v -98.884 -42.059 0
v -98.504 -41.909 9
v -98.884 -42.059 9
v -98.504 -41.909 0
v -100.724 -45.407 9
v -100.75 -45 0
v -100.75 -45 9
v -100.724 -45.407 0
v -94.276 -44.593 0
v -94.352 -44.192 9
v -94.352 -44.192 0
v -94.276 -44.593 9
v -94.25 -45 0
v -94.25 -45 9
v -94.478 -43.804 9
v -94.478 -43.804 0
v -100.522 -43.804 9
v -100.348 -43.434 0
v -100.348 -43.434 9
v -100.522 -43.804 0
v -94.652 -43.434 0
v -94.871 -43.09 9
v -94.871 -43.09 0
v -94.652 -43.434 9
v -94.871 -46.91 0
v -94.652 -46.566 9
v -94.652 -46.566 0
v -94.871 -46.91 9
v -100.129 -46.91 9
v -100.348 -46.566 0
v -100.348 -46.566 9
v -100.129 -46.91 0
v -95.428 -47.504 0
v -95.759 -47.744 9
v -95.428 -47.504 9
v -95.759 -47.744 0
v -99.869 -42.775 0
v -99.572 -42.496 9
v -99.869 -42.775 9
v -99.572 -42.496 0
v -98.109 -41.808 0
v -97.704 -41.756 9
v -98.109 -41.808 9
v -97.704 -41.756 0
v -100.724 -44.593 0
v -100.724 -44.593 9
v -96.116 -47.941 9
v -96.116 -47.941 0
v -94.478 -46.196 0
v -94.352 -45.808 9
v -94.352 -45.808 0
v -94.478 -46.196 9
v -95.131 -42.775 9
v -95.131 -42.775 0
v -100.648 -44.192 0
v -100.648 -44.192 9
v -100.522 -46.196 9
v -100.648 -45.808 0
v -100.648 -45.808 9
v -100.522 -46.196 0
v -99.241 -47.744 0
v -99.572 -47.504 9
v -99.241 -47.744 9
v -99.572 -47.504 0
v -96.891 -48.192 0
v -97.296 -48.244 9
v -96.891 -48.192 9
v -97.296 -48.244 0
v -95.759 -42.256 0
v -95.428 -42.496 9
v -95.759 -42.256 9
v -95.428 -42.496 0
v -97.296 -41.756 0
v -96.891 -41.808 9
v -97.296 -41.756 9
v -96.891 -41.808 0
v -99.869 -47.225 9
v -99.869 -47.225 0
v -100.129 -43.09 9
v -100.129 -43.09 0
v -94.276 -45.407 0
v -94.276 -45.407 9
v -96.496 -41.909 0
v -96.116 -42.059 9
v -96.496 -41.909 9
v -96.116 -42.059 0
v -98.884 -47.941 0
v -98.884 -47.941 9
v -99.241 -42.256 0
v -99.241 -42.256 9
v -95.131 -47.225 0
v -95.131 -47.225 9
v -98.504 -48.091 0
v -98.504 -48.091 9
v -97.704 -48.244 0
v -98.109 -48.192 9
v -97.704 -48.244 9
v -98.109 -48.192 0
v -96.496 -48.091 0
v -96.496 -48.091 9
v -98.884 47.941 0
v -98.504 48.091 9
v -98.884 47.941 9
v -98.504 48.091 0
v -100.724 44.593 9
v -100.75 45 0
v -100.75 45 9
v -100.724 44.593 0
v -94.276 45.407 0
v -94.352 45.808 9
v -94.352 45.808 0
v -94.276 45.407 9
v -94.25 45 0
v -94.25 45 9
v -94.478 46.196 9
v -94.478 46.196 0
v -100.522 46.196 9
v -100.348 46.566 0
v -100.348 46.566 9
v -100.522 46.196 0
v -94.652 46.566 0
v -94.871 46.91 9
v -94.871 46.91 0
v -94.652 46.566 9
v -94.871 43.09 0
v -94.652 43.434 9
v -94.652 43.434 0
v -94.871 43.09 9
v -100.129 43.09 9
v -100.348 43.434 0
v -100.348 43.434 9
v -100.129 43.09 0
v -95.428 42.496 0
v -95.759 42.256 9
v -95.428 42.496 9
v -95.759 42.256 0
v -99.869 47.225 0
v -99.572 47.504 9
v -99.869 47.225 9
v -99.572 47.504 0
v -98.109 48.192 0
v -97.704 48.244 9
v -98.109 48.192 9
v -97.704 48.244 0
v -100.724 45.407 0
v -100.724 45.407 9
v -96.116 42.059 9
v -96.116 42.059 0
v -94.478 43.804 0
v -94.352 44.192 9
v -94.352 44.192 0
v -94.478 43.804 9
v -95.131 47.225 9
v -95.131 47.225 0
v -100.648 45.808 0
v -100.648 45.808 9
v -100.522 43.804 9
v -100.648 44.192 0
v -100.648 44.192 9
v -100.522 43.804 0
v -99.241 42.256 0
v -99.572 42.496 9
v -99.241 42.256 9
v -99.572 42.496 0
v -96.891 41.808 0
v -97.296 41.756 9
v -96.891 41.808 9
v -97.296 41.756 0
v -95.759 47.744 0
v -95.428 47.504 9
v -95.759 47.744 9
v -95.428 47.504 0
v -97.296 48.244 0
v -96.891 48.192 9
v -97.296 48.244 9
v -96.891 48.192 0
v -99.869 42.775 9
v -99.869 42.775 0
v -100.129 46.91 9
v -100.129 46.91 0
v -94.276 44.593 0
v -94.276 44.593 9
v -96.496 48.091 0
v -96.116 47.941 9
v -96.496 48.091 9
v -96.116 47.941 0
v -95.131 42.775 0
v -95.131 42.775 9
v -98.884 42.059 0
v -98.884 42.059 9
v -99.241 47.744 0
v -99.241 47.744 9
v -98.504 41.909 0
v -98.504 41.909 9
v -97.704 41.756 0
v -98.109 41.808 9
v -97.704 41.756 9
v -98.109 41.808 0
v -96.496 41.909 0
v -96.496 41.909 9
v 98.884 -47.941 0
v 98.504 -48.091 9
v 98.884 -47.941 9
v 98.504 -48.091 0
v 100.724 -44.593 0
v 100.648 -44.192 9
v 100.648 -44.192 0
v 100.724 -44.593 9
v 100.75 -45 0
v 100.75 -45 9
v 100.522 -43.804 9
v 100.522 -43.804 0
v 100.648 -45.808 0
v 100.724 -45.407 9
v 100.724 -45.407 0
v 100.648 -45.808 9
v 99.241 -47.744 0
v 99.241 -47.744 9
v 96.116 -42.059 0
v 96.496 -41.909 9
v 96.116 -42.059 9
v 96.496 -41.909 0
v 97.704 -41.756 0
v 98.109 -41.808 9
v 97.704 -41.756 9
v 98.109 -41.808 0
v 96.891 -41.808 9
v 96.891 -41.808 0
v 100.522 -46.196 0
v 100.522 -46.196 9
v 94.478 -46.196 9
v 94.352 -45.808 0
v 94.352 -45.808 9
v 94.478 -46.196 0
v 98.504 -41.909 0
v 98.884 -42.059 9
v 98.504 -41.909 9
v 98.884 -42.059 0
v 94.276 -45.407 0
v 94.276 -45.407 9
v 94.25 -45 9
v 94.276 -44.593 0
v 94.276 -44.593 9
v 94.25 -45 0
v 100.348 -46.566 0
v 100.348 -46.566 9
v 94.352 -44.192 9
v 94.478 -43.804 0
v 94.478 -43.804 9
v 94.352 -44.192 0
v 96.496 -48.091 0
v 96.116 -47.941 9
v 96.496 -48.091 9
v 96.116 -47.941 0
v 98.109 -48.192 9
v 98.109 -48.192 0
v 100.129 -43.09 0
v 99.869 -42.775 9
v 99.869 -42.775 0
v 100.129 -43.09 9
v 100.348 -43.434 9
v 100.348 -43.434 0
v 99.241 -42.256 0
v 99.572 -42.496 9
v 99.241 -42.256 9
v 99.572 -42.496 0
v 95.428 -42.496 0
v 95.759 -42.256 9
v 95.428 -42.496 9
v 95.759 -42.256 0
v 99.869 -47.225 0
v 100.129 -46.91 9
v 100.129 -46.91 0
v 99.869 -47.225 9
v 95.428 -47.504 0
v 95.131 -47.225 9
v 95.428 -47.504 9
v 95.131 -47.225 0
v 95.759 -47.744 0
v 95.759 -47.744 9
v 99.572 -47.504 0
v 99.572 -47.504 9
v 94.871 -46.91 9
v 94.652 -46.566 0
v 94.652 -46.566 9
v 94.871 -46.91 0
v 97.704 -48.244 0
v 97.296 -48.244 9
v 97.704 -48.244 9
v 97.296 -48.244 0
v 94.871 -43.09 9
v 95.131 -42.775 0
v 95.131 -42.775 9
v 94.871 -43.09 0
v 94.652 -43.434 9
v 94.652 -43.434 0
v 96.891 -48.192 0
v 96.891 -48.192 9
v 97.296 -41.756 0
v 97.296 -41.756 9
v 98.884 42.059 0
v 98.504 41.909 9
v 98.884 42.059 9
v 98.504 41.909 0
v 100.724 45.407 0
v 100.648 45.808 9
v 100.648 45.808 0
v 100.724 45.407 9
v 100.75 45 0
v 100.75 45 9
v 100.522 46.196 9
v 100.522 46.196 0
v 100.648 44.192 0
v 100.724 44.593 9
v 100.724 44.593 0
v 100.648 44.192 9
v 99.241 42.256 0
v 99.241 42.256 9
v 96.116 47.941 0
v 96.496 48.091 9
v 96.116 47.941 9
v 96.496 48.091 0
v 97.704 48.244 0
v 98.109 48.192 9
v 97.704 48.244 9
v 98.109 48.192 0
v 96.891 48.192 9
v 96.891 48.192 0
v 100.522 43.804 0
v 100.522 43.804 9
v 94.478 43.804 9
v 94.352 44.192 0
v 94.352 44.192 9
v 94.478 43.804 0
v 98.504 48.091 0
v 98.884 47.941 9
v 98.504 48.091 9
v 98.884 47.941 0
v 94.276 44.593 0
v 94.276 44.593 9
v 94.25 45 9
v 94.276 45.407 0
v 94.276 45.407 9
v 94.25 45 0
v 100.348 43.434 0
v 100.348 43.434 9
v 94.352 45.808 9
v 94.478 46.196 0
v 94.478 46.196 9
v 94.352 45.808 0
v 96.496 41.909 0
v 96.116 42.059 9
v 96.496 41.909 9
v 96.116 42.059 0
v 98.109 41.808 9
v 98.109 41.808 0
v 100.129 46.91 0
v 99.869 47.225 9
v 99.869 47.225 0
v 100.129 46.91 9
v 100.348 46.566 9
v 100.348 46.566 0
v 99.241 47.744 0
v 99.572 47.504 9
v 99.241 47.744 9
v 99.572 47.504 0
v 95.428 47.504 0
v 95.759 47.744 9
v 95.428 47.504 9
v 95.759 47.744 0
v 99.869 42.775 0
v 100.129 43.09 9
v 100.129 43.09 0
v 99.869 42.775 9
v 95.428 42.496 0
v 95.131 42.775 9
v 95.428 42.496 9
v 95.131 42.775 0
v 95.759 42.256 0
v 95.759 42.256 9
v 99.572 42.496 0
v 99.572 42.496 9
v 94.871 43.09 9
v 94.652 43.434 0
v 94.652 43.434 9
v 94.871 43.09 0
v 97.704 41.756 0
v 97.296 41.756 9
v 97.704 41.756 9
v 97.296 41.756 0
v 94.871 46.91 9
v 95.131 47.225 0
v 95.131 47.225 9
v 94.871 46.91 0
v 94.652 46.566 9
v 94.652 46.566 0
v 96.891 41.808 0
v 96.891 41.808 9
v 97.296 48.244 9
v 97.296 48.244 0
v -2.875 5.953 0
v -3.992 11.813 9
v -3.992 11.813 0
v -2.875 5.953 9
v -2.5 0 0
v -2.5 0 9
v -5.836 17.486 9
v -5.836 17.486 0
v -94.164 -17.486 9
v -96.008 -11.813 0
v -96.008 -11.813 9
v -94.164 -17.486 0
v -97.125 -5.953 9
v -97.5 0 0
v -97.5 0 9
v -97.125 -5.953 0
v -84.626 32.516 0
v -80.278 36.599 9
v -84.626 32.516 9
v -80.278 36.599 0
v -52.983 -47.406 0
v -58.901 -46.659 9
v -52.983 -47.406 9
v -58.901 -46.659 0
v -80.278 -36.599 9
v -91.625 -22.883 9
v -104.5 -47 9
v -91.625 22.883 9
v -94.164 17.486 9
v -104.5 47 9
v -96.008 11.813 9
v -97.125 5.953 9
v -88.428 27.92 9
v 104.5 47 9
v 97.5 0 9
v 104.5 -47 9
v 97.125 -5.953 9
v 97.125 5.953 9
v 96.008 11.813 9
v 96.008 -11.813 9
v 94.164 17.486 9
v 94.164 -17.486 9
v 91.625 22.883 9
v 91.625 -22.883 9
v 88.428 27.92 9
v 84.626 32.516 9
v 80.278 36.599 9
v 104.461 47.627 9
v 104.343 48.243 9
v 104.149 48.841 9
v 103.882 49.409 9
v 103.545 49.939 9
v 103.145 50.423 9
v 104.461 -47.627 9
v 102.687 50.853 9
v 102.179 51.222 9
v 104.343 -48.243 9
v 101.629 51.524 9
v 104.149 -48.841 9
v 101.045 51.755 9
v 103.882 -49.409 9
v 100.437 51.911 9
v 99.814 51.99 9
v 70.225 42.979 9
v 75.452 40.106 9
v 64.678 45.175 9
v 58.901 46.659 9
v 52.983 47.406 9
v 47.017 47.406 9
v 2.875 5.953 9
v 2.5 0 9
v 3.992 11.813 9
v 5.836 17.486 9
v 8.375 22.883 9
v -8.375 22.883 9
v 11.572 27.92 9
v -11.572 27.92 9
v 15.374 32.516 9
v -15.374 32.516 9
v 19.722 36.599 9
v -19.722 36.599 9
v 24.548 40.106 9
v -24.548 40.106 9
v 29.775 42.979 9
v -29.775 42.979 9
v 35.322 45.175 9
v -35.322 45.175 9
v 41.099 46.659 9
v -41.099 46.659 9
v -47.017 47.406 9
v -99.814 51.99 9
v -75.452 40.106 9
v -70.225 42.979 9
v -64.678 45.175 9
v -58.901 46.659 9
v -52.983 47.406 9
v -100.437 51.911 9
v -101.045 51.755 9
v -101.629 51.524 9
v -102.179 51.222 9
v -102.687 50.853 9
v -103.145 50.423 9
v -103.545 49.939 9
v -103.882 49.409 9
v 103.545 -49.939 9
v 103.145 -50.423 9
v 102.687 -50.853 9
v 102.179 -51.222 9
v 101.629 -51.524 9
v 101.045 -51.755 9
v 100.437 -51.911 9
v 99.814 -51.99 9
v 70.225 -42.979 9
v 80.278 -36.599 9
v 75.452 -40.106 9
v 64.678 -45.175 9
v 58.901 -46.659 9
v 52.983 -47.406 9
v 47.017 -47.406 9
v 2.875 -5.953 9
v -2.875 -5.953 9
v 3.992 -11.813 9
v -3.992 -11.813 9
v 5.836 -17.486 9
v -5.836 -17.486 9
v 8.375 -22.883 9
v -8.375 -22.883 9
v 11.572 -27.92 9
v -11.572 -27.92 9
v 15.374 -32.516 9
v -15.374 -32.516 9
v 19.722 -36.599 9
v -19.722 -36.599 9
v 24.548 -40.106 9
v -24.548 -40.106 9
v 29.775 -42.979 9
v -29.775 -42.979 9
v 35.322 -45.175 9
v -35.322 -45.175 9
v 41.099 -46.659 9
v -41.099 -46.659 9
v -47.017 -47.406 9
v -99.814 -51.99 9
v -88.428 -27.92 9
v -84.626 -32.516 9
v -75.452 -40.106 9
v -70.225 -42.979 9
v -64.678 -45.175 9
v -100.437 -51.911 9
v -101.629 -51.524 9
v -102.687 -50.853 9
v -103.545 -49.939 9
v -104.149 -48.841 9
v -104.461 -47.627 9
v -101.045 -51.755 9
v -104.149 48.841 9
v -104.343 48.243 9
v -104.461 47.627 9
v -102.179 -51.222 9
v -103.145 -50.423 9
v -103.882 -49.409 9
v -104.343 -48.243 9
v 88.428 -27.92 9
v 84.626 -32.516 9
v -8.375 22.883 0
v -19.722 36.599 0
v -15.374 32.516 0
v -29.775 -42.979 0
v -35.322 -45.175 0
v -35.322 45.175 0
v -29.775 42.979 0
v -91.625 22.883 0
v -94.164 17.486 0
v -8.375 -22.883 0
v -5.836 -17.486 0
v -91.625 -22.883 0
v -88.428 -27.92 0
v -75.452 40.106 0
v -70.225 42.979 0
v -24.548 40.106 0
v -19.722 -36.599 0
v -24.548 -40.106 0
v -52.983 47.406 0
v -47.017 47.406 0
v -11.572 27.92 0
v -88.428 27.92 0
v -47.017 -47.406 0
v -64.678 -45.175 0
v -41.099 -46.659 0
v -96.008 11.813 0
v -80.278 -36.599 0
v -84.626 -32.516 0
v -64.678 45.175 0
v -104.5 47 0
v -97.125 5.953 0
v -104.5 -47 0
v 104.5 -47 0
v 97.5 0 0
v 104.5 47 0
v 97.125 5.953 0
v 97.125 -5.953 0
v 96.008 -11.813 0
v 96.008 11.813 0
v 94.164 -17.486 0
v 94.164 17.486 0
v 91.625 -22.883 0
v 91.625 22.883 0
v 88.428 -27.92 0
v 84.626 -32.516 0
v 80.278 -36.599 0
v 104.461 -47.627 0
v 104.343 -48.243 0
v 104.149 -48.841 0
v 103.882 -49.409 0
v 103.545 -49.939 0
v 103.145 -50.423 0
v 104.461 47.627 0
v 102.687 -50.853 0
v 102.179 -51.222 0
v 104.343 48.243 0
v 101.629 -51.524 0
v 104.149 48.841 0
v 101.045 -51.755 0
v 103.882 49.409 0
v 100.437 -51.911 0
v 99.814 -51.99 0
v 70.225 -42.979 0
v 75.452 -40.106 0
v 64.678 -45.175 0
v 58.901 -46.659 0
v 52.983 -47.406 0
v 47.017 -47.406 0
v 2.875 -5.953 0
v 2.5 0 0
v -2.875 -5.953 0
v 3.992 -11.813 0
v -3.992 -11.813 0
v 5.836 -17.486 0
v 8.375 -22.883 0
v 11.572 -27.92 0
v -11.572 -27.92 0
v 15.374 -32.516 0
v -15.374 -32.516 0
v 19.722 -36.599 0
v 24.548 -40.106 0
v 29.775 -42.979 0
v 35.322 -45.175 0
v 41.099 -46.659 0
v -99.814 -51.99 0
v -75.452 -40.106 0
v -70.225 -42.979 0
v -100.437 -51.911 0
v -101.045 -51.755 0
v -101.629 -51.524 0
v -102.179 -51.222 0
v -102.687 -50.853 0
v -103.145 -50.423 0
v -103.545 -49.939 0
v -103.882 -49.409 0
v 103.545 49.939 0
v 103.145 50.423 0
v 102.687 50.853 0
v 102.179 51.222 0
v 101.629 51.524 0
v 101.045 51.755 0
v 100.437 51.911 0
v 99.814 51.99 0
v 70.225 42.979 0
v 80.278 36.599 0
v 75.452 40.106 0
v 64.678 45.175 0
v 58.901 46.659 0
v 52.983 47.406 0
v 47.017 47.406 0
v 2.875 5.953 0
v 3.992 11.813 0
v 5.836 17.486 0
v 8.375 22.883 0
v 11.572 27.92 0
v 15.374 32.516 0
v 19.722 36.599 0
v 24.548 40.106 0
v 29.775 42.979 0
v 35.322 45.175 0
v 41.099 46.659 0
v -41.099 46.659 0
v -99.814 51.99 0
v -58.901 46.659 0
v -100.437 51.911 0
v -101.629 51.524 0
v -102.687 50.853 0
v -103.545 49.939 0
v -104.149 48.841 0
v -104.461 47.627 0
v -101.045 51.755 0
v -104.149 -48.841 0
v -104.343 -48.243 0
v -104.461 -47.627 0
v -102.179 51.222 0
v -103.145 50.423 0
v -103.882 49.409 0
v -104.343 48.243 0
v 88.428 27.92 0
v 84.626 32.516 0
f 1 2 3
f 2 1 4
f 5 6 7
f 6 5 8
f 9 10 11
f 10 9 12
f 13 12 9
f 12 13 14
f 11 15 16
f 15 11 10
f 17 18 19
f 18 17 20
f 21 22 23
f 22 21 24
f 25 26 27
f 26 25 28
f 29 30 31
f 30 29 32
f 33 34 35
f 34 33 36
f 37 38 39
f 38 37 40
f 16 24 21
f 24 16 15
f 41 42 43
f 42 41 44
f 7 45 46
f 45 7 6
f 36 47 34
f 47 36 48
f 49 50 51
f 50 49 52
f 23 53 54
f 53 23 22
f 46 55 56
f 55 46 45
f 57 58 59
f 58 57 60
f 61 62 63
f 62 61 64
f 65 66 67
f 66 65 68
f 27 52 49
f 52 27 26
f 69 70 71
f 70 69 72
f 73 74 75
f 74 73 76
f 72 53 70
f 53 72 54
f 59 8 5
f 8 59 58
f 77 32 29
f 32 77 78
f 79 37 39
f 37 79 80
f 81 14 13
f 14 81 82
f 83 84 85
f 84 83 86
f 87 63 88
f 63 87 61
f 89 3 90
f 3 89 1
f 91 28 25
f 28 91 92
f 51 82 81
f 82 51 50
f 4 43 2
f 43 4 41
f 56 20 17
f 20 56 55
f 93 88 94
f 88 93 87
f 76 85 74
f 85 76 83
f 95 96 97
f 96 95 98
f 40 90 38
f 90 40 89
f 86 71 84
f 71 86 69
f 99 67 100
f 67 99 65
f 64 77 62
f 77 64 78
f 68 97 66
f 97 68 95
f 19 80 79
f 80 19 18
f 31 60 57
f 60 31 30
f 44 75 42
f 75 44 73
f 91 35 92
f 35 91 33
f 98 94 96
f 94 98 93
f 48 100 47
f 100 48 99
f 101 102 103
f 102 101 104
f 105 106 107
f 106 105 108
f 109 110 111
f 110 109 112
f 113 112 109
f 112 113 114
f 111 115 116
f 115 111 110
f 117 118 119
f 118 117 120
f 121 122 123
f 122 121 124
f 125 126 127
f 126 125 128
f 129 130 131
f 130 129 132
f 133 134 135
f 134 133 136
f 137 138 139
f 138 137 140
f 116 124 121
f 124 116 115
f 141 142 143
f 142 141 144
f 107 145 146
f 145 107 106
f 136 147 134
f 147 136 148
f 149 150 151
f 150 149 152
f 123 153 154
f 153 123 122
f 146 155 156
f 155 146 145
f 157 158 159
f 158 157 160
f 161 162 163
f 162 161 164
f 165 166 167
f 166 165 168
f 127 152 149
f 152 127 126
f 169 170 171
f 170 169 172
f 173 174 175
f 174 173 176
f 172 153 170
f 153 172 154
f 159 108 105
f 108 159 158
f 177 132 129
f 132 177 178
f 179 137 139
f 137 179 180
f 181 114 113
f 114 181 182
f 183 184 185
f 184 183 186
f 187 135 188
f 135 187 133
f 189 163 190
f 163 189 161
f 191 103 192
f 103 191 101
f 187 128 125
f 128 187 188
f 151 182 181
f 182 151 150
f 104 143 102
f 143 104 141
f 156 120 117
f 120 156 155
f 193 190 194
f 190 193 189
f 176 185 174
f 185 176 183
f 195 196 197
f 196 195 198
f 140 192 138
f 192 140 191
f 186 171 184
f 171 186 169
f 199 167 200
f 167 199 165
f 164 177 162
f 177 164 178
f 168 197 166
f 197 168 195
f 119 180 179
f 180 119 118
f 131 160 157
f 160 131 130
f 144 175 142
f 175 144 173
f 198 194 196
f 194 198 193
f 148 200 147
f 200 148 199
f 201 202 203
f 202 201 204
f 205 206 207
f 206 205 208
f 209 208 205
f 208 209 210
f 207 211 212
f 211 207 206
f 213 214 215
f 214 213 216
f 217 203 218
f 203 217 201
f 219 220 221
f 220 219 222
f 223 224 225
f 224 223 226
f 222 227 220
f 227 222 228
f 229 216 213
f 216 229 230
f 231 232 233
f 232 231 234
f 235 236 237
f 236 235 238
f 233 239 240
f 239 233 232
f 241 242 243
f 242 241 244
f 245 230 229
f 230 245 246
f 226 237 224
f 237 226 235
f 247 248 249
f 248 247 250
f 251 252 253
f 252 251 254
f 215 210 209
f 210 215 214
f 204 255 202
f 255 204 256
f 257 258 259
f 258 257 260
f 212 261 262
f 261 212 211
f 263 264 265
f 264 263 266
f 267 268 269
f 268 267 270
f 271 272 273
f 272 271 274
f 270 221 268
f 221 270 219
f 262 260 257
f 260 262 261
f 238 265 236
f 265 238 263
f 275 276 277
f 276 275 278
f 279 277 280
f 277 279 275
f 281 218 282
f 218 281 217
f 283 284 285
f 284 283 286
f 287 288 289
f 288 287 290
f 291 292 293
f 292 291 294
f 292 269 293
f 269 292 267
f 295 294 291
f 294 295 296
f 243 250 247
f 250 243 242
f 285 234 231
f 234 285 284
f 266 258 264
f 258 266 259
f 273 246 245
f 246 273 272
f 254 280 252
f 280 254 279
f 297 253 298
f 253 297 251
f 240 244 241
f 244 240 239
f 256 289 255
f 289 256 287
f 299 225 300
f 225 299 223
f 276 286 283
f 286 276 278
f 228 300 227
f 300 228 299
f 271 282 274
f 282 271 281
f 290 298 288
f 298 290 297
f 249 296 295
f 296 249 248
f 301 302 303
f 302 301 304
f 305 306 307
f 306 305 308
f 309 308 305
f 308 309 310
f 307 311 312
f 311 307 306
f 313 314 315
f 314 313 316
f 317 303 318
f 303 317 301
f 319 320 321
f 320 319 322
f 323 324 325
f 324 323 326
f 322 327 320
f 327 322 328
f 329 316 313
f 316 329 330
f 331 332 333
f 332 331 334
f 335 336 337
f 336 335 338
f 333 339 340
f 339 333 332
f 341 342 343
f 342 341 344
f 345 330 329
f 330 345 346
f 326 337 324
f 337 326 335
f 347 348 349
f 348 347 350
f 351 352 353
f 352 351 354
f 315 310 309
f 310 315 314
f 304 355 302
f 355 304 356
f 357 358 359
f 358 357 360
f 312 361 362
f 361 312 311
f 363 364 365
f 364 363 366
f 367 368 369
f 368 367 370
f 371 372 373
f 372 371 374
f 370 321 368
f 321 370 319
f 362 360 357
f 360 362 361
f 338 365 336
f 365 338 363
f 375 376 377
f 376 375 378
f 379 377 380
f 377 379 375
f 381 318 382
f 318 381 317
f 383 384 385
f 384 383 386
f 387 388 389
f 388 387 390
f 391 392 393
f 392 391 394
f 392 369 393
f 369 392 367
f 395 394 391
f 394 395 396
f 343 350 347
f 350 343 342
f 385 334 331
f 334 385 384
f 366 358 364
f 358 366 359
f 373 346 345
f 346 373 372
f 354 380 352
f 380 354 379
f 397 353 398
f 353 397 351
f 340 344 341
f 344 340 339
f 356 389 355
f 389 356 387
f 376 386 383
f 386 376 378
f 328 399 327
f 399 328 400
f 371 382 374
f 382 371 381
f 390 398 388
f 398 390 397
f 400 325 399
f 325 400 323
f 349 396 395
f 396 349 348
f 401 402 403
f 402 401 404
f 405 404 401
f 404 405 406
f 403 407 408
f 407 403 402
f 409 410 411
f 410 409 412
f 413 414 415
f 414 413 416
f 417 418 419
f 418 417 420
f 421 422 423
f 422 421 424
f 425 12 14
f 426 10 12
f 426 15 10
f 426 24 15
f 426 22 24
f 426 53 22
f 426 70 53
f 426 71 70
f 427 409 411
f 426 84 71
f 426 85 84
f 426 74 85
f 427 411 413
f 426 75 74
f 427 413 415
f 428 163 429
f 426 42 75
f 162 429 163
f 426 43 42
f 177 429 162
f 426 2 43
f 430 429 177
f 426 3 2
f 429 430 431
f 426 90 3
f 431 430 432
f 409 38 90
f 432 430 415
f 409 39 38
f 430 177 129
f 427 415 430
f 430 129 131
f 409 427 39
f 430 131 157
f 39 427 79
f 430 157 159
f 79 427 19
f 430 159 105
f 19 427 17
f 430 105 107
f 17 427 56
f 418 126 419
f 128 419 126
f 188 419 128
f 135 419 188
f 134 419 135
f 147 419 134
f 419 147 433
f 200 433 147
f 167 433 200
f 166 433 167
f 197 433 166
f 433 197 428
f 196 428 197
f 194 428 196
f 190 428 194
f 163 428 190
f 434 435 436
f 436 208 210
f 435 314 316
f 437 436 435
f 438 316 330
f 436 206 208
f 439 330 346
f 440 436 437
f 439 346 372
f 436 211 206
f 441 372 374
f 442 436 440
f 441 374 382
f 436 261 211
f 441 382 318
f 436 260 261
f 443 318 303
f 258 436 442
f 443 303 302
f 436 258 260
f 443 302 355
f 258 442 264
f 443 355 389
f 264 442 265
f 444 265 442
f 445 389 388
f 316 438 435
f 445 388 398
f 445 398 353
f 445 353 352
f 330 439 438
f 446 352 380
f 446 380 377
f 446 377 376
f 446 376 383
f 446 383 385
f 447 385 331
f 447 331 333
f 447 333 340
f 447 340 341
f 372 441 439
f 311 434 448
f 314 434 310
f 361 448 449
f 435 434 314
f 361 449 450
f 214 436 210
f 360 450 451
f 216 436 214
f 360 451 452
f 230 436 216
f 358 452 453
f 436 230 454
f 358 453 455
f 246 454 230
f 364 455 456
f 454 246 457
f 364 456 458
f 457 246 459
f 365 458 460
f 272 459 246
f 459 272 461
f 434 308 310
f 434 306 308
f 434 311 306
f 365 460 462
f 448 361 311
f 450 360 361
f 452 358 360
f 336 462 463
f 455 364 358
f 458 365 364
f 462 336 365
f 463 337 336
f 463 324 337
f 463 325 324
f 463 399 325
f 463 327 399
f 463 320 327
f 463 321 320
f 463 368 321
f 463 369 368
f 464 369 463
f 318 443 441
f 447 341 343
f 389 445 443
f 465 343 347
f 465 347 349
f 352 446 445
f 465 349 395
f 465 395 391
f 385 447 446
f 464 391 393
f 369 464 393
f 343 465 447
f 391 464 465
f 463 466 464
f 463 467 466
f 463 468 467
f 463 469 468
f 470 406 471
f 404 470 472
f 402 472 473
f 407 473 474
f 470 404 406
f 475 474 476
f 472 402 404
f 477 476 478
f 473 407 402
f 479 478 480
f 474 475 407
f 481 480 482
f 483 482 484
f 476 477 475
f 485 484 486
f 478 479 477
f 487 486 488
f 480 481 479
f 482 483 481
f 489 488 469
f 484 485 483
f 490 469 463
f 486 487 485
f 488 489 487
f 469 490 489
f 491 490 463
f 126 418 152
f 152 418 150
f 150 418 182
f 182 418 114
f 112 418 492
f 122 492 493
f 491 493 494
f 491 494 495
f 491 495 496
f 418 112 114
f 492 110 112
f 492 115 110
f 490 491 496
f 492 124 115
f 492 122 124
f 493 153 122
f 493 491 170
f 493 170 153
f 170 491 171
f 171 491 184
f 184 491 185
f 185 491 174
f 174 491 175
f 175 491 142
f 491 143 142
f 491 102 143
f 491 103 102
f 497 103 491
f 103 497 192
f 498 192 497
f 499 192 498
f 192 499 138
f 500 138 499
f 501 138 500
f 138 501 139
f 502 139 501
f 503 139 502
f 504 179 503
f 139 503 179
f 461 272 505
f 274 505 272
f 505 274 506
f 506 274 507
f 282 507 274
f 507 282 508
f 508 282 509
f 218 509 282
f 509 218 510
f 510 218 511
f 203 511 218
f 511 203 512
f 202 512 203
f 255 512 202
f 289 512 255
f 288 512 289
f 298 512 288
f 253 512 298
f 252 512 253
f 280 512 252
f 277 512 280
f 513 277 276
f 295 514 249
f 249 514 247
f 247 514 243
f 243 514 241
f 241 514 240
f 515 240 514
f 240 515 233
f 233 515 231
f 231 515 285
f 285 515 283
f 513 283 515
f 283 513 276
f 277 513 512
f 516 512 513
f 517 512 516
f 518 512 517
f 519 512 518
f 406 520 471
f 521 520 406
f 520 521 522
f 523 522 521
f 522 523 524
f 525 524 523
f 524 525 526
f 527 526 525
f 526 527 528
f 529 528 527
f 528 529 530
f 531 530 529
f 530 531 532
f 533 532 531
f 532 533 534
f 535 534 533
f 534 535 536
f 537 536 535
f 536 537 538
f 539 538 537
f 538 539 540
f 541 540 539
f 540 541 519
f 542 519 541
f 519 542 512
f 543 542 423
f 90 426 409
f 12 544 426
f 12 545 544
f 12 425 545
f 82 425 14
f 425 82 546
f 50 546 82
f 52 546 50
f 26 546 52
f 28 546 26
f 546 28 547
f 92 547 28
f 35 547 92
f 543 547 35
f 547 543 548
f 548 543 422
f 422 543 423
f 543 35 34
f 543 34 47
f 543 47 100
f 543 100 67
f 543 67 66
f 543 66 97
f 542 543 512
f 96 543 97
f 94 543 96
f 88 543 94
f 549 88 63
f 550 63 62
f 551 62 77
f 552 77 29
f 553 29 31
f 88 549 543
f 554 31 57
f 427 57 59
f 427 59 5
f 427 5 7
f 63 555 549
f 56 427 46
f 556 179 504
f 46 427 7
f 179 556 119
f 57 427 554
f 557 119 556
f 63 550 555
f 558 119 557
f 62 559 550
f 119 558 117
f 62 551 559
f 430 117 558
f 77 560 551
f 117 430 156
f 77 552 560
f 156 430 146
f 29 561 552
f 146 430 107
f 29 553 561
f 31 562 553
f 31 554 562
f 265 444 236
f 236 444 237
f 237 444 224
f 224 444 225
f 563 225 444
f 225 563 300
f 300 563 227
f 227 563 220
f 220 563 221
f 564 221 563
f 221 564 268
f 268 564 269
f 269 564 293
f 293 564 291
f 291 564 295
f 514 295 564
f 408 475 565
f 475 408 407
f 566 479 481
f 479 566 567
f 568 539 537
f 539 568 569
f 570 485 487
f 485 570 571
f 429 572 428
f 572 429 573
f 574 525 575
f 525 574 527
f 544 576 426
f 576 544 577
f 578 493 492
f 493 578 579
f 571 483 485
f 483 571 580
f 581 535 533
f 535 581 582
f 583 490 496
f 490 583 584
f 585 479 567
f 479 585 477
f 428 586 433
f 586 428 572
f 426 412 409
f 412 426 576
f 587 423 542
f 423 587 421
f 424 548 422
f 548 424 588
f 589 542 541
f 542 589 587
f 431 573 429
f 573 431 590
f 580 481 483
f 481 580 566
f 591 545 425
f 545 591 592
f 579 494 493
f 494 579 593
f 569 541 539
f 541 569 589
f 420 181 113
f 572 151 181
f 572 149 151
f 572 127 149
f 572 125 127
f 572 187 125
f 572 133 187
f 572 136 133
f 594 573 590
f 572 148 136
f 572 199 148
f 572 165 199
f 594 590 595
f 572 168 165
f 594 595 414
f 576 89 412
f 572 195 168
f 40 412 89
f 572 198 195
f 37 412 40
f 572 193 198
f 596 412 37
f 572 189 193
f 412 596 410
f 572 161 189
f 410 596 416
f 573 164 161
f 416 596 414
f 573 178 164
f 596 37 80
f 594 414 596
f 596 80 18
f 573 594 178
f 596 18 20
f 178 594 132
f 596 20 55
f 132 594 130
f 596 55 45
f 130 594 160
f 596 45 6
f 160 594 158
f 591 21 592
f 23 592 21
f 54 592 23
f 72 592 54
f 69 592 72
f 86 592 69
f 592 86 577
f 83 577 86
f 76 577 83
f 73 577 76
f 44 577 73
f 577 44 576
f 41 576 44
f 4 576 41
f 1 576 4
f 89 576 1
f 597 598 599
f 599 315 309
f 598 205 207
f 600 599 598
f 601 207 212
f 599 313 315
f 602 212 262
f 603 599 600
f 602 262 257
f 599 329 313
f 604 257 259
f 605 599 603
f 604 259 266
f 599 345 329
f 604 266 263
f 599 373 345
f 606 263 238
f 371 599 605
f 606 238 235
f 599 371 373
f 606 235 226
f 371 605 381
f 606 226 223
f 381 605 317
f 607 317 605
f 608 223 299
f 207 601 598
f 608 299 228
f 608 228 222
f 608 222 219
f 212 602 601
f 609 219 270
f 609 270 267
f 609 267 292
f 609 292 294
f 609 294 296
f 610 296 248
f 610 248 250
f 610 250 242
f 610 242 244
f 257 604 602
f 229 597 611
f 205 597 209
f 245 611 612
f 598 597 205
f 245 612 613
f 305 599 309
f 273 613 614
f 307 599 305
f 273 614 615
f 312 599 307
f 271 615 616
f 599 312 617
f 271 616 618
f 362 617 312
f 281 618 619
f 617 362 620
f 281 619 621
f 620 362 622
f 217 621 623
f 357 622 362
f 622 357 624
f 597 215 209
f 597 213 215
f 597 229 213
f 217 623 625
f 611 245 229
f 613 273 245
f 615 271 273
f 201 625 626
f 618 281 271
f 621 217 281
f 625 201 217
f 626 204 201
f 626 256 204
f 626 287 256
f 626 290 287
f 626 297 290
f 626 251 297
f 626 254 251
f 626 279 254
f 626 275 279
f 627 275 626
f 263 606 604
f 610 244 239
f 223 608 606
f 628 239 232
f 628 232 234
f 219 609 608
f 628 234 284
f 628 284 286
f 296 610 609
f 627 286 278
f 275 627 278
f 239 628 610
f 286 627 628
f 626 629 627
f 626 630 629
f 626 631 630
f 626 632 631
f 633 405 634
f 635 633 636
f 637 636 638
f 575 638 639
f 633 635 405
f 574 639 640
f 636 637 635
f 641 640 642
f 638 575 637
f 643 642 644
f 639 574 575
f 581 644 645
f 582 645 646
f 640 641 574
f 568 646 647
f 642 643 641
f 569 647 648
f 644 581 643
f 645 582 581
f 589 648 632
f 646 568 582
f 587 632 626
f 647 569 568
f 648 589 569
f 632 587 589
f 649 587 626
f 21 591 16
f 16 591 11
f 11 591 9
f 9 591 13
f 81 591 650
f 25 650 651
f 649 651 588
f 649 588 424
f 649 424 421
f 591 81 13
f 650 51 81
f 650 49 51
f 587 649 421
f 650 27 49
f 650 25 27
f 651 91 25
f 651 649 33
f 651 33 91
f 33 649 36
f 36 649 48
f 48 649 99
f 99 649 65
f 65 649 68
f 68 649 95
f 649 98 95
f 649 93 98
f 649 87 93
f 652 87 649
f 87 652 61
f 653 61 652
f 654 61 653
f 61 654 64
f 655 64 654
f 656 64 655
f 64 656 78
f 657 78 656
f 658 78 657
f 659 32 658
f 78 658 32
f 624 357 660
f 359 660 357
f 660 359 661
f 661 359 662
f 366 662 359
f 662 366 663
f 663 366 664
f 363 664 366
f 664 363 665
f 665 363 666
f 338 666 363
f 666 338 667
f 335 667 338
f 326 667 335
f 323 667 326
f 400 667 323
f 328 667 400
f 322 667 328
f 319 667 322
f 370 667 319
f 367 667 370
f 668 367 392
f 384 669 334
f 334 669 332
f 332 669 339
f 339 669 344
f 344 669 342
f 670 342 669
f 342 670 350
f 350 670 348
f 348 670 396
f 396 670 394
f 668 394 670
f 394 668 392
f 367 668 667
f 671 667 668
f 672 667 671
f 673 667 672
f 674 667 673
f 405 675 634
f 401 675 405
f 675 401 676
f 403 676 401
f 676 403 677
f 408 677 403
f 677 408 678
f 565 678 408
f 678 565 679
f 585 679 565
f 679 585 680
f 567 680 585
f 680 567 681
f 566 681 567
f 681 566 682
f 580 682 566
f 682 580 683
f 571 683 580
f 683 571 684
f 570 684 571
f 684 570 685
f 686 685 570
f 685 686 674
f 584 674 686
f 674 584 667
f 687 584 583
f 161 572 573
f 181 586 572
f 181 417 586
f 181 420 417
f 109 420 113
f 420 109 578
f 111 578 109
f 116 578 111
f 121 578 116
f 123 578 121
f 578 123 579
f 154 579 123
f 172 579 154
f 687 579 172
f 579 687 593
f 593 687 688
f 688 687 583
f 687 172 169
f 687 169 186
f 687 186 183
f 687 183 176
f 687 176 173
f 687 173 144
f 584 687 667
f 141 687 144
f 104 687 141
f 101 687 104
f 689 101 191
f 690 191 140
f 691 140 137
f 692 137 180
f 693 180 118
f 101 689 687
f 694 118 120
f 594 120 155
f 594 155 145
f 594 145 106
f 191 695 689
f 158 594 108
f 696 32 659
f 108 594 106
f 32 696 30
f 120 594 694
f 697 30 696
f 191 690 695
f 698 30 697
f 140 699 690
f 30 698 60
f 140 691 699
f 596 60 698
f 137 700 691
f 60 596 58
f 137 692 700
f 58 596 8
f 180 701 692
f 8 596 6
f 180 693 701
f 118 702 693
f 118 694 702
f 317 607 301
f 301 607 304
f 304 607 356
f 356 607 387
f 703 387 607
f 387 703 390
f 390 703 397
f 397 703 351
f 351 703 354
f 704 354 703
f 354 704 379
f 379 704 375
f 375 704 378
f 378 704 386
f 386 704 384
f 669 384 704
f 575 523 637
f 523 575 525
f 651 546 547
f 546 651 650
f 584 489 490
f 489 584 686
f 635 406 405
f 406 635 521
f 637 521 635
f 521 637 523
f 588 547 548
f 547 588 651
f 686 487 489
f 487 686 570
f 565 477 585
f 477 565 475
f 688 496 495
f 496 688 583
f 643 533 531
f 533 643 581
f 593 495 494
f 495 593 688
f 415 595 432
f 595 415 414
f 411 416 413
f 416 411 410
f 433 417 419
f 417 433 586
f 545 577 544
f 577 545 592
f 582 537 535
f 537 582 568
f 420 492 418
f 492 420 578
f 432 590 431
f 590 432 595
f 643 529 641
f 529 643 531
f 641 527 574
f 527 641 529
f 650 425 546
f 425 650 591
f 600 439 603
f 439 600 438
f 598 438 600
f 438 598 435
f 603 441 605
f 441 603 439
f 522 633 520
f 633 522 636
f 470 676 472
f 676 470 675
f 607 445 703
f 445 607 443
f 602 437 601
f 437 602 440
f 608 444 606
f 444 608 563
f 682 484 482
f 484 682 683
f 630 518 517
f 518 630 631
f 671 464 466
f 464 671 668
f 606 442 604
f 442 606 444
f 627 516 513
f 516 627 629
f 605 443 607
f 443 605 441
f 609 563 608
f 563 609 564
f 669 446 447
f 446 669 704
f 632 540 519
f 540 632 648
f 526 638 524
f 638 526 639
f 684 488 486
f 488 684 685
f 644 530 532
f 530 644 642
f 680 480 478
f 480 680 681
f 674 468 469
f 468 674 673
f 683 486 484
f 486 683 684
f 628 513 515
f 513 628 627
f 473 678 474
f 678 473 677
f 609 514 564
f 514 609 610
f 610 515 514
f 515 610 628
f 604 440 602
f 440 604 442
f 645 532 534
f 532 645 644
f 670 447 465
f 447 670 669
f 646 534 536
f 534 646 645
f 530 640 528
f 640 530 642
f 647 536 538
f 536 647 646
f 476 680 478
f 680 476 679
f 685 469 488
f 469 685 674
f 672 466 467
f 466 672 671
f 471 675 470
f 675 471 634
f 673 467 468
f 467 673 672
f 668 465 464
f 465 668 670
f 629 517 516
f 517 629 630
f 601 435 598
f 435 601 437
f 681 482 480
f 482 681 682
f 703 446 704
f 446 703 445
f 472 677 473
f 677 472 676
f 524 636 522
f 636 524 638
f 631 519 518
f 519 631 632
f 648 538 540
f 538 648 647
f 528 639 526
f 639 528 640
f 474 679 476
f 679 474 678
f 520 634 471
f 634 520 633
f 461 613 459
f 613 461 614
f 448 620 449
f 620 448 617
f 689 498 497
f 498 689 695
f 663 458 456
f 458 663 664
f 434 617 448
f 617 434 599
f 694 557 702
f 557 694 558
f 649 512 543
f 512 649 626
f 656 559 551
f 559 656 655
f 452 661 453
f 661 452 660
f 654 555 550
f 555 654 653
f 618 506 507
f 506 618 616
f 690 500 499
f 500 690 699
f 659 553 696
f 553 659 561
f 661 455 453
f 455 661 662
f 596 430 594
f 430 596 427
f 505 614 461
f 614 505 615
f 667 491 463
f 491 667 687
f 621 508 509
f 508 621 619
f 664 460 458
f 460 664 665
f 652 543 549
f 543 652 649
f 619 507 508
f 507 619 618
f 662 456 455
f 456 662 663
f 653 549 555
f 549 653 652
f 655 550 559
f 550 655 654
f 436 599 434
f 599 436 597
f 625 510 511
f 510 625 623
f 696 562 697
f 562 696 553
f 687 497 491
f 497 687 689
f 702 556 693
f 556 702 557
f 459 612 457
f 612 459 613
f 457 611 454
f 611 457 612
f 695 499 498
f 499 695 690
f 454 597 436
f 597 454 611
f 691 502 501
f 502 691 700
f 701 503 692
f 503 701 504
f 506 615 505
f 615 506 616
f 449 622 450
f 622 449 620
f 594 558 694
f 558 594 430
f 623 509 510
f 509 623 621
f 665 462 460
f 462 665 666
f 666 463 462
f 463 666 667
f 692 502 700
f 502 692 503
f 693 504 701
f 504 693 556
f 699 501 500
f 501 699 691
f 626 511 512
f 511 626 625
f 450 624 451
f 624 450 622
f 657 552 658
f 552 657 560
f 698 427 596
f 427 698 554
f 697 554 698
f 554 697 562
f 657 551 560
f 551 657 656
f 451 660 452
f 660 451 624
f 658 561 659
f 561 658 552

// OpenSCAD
$fn = 50;


difference() {
	union() {
		hull() {
			translate(v = [-99.5000000000, 47.0000000000, 0]) {
				cylinder(h = 9, r = 5);
			}
			translate(v = [99.5000000000, 47.0000000000, 0]) {
				cylinder(h = 9, r = 5);
			}
			translate(v = [-99.5000000000, -47.0000000000, 0]) {
				cylinder(h = 9, r = 5);
			}
			translate(v = [99.5000000000, -47.0000000000, 0]) {
				cylinder(h = 9, r = 5);
			}
		}
	}
	union() {
		#translate(v = [-97.5000000000, -45.0000000000, -100.0000000000]) {
			cylinder(h = 200, r = 3.2500000000);
		}
		#translate(v = [-97.5000000000, 45.0000000000, -100.0000000000]) {
			cylinder(h = 200, r = 3.2500000000);
		}
		#translate(v = [97.5000000000, -45.0000000000, -100.0000000000]) {
			cylinder(h = 200, r = 3.2500000000);
		}
		#translate(v = [97.5000000000, 45.0000000000, -100.0000000000]) {
			cylinder(h = 200, r = 3.2500000000);
		}
		#translate(v = [-50.0000000000, 0, 0]) {
			cylinder(h = 9, r = 47.5000000000);
		}
		#translate(v = [50.0000000000, 0, 0]) {
			cylinder(h = 9, r = 47.5000000000);
		}
	}
}
